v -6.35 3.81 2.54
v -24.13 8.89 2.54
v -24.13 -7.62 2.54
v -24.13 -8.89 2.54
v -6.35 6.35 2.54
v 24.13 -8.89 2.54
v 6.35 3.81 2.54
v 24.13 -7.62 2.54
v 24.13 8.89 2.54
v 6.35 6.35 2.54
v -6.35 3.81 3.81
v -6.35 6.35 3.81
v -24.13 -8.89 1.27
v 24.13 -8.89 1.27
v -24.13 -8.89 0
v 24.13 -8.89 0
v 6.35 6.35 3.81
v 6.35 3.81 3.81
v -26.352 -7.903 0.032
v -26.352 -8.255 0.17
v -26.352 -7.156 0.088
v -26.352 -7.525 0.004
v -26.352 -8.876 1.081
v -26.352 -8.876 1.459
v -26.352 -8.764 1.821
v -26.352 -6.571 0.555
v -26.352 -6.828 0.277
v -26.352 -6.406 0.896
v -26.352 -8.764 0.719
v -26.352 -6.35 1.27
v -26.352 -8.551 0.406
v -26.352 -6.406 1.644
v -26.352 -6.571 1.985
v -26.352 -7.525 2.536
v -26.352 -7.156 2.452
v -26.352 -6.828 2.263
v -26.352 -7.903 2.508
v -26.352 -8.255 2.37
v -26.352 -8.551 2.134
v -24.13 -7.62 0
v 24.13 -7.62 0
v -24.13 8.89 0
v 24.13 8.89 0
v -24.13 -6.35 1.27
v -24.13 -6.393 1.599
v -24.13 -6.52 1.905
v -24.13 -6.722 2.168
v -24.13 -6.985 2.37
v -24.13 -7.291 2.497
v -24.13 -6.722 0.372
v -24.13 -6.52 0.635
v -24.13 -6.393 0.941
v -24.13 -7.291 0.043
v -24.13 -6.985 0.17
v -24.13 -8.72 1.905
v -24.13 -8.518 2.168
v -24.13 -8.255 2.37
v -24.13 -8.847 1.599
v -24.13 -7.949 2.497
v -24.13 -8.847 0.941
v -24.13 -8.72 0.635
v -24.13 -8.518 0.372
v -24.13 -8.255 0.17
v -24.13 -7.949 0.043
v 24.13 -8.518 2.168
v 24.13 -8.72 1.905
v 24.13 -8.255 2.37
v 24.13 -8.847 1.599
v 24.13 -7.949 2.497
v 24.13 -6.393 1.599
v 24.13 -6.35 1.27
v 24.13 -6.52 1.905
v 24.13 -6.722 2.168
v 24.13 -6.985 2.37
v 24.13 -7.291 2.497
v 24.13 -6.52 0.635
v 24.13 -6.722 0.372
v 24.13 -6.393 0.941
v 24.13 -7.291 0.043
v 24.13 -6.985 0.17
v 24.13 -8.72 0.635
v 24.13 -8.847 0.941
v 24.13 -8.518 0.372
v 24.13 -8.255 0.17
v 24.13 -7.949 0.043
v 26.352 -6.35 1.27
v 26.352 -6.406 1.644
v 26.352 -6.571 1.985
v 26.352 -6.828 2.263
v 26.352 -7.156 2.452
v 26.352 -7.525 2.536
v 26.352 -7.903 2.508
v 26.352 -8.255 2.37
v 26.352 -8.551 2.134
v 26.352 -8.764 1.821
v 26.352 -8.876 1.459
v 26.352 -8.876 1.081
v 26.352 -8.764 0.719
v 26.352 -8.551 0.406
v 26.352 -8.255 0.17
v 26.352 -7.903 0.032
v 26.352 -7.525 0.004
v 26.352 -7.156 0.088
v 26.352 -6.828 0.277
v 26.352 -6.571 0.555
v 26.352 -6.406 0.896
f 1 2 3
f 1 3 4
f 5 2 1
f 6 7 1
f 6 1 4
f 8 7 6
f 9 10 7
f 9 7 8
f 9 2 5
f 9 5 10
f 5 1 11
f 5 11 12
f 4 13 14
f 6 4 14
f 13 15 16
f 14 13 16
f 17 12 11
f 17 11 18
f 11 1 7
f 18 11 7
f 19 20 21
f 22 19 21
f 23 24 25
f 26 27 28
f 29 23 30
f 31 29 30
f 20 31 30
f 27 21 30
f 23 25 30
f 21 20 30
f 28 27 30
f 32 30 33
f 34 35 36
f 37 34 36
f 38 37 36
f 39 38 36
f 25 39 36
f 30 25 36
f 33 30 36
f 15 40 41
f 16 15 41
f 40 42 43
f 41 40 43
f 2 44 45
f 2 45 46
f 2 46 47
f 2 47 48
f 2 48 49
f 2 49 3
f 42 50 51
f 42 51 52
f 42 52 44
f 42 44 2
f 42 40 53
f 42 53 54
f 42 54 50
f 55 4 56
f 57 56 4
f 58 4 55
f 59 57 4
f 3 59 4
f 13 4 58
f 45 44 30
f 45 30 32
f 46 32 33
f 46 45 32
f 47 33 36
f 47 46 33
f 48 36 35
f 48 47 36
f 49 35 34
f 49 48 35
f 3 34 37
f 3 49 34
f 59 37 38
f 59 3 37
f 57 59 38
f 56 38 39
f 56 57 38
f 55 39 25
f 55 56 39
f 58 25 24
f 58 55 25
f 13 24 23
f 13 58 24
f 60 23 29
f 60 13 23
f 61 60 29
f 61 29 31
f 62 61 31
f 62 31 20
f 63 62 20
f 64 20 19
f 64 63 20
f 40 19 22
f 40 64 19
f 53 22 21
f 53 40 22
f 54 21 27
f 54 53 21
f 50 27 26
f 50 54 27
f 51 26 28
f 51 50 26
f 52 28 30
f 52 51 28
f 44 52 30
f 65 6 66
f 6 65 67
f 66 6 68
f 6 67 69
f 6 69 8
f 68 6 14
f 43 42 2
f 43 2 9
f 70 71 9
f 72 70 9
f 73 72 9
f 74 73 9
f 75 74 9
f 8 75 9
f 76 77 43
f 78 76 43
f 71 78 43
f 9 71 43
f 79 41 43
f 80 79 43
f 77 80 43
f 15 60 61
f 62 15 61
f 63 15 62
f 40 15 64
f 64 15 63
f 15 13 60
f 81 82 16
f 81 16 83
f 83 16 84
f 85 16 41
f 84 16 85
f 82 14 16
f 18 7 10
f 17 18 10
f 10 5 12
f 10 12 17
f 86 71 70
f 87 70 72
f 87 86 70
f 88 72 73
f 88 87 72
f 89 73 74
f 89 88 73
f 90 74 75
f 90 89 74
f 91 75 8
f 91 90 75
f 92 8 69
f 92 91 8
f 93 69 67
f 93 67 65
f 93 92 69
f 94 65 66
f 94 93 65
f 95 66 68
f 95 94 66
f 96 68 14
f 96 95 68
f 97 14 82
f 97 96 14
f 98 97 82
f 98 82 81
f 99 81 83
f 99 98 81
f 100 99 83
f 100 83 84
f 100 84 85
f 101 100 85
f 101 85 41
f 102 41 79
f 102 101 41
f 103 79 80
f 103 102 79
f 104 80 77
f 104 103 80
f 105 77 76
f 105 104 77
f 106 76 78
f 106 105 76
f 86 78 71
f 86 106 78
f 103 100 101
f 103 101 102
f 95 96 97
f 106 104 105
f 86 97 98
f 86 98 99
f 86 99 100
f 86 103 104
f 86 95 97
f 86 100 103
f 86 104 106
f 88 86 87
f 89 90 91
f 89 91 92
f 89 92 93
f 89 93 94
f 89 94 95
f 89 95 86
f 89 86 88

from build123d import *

# Parameters (mm, degrees)
F0_W     = 48.26
F0_H     = 17.78
F1_DEPTH = 2.54
F2_R     = 1.27
F3_DEPTH = 26.3525
F4_W     = 12.7
F4_H     = 2.54
F5_DEPTH = 1.27


with BuildPart() as f1:
    # F0 (on Top) → F1 (new body)
    with BuildSketch(Plane.XY):
        Rectangle(F0_W, F0_H)
    extrude(amount=F1_DEPTH)

    # F2 (on Right) → F3 (join, symmetric)
    with BuildSketch(Plane.YZ):
        with Locations((-7.62, 1.27)):
            Circle(F2_R)
    extrude(amount=F3_DEPTH, both=True)

    # F4 (on face) → F5 (join)
    with BuildSketch(Plane.XY.offset(2.54)):
        with Locations((0, 5.08)):
            Rectangle(F4_W, F4_H)
    extrude(amount=F5_DEPTH)


solid = f1.part
